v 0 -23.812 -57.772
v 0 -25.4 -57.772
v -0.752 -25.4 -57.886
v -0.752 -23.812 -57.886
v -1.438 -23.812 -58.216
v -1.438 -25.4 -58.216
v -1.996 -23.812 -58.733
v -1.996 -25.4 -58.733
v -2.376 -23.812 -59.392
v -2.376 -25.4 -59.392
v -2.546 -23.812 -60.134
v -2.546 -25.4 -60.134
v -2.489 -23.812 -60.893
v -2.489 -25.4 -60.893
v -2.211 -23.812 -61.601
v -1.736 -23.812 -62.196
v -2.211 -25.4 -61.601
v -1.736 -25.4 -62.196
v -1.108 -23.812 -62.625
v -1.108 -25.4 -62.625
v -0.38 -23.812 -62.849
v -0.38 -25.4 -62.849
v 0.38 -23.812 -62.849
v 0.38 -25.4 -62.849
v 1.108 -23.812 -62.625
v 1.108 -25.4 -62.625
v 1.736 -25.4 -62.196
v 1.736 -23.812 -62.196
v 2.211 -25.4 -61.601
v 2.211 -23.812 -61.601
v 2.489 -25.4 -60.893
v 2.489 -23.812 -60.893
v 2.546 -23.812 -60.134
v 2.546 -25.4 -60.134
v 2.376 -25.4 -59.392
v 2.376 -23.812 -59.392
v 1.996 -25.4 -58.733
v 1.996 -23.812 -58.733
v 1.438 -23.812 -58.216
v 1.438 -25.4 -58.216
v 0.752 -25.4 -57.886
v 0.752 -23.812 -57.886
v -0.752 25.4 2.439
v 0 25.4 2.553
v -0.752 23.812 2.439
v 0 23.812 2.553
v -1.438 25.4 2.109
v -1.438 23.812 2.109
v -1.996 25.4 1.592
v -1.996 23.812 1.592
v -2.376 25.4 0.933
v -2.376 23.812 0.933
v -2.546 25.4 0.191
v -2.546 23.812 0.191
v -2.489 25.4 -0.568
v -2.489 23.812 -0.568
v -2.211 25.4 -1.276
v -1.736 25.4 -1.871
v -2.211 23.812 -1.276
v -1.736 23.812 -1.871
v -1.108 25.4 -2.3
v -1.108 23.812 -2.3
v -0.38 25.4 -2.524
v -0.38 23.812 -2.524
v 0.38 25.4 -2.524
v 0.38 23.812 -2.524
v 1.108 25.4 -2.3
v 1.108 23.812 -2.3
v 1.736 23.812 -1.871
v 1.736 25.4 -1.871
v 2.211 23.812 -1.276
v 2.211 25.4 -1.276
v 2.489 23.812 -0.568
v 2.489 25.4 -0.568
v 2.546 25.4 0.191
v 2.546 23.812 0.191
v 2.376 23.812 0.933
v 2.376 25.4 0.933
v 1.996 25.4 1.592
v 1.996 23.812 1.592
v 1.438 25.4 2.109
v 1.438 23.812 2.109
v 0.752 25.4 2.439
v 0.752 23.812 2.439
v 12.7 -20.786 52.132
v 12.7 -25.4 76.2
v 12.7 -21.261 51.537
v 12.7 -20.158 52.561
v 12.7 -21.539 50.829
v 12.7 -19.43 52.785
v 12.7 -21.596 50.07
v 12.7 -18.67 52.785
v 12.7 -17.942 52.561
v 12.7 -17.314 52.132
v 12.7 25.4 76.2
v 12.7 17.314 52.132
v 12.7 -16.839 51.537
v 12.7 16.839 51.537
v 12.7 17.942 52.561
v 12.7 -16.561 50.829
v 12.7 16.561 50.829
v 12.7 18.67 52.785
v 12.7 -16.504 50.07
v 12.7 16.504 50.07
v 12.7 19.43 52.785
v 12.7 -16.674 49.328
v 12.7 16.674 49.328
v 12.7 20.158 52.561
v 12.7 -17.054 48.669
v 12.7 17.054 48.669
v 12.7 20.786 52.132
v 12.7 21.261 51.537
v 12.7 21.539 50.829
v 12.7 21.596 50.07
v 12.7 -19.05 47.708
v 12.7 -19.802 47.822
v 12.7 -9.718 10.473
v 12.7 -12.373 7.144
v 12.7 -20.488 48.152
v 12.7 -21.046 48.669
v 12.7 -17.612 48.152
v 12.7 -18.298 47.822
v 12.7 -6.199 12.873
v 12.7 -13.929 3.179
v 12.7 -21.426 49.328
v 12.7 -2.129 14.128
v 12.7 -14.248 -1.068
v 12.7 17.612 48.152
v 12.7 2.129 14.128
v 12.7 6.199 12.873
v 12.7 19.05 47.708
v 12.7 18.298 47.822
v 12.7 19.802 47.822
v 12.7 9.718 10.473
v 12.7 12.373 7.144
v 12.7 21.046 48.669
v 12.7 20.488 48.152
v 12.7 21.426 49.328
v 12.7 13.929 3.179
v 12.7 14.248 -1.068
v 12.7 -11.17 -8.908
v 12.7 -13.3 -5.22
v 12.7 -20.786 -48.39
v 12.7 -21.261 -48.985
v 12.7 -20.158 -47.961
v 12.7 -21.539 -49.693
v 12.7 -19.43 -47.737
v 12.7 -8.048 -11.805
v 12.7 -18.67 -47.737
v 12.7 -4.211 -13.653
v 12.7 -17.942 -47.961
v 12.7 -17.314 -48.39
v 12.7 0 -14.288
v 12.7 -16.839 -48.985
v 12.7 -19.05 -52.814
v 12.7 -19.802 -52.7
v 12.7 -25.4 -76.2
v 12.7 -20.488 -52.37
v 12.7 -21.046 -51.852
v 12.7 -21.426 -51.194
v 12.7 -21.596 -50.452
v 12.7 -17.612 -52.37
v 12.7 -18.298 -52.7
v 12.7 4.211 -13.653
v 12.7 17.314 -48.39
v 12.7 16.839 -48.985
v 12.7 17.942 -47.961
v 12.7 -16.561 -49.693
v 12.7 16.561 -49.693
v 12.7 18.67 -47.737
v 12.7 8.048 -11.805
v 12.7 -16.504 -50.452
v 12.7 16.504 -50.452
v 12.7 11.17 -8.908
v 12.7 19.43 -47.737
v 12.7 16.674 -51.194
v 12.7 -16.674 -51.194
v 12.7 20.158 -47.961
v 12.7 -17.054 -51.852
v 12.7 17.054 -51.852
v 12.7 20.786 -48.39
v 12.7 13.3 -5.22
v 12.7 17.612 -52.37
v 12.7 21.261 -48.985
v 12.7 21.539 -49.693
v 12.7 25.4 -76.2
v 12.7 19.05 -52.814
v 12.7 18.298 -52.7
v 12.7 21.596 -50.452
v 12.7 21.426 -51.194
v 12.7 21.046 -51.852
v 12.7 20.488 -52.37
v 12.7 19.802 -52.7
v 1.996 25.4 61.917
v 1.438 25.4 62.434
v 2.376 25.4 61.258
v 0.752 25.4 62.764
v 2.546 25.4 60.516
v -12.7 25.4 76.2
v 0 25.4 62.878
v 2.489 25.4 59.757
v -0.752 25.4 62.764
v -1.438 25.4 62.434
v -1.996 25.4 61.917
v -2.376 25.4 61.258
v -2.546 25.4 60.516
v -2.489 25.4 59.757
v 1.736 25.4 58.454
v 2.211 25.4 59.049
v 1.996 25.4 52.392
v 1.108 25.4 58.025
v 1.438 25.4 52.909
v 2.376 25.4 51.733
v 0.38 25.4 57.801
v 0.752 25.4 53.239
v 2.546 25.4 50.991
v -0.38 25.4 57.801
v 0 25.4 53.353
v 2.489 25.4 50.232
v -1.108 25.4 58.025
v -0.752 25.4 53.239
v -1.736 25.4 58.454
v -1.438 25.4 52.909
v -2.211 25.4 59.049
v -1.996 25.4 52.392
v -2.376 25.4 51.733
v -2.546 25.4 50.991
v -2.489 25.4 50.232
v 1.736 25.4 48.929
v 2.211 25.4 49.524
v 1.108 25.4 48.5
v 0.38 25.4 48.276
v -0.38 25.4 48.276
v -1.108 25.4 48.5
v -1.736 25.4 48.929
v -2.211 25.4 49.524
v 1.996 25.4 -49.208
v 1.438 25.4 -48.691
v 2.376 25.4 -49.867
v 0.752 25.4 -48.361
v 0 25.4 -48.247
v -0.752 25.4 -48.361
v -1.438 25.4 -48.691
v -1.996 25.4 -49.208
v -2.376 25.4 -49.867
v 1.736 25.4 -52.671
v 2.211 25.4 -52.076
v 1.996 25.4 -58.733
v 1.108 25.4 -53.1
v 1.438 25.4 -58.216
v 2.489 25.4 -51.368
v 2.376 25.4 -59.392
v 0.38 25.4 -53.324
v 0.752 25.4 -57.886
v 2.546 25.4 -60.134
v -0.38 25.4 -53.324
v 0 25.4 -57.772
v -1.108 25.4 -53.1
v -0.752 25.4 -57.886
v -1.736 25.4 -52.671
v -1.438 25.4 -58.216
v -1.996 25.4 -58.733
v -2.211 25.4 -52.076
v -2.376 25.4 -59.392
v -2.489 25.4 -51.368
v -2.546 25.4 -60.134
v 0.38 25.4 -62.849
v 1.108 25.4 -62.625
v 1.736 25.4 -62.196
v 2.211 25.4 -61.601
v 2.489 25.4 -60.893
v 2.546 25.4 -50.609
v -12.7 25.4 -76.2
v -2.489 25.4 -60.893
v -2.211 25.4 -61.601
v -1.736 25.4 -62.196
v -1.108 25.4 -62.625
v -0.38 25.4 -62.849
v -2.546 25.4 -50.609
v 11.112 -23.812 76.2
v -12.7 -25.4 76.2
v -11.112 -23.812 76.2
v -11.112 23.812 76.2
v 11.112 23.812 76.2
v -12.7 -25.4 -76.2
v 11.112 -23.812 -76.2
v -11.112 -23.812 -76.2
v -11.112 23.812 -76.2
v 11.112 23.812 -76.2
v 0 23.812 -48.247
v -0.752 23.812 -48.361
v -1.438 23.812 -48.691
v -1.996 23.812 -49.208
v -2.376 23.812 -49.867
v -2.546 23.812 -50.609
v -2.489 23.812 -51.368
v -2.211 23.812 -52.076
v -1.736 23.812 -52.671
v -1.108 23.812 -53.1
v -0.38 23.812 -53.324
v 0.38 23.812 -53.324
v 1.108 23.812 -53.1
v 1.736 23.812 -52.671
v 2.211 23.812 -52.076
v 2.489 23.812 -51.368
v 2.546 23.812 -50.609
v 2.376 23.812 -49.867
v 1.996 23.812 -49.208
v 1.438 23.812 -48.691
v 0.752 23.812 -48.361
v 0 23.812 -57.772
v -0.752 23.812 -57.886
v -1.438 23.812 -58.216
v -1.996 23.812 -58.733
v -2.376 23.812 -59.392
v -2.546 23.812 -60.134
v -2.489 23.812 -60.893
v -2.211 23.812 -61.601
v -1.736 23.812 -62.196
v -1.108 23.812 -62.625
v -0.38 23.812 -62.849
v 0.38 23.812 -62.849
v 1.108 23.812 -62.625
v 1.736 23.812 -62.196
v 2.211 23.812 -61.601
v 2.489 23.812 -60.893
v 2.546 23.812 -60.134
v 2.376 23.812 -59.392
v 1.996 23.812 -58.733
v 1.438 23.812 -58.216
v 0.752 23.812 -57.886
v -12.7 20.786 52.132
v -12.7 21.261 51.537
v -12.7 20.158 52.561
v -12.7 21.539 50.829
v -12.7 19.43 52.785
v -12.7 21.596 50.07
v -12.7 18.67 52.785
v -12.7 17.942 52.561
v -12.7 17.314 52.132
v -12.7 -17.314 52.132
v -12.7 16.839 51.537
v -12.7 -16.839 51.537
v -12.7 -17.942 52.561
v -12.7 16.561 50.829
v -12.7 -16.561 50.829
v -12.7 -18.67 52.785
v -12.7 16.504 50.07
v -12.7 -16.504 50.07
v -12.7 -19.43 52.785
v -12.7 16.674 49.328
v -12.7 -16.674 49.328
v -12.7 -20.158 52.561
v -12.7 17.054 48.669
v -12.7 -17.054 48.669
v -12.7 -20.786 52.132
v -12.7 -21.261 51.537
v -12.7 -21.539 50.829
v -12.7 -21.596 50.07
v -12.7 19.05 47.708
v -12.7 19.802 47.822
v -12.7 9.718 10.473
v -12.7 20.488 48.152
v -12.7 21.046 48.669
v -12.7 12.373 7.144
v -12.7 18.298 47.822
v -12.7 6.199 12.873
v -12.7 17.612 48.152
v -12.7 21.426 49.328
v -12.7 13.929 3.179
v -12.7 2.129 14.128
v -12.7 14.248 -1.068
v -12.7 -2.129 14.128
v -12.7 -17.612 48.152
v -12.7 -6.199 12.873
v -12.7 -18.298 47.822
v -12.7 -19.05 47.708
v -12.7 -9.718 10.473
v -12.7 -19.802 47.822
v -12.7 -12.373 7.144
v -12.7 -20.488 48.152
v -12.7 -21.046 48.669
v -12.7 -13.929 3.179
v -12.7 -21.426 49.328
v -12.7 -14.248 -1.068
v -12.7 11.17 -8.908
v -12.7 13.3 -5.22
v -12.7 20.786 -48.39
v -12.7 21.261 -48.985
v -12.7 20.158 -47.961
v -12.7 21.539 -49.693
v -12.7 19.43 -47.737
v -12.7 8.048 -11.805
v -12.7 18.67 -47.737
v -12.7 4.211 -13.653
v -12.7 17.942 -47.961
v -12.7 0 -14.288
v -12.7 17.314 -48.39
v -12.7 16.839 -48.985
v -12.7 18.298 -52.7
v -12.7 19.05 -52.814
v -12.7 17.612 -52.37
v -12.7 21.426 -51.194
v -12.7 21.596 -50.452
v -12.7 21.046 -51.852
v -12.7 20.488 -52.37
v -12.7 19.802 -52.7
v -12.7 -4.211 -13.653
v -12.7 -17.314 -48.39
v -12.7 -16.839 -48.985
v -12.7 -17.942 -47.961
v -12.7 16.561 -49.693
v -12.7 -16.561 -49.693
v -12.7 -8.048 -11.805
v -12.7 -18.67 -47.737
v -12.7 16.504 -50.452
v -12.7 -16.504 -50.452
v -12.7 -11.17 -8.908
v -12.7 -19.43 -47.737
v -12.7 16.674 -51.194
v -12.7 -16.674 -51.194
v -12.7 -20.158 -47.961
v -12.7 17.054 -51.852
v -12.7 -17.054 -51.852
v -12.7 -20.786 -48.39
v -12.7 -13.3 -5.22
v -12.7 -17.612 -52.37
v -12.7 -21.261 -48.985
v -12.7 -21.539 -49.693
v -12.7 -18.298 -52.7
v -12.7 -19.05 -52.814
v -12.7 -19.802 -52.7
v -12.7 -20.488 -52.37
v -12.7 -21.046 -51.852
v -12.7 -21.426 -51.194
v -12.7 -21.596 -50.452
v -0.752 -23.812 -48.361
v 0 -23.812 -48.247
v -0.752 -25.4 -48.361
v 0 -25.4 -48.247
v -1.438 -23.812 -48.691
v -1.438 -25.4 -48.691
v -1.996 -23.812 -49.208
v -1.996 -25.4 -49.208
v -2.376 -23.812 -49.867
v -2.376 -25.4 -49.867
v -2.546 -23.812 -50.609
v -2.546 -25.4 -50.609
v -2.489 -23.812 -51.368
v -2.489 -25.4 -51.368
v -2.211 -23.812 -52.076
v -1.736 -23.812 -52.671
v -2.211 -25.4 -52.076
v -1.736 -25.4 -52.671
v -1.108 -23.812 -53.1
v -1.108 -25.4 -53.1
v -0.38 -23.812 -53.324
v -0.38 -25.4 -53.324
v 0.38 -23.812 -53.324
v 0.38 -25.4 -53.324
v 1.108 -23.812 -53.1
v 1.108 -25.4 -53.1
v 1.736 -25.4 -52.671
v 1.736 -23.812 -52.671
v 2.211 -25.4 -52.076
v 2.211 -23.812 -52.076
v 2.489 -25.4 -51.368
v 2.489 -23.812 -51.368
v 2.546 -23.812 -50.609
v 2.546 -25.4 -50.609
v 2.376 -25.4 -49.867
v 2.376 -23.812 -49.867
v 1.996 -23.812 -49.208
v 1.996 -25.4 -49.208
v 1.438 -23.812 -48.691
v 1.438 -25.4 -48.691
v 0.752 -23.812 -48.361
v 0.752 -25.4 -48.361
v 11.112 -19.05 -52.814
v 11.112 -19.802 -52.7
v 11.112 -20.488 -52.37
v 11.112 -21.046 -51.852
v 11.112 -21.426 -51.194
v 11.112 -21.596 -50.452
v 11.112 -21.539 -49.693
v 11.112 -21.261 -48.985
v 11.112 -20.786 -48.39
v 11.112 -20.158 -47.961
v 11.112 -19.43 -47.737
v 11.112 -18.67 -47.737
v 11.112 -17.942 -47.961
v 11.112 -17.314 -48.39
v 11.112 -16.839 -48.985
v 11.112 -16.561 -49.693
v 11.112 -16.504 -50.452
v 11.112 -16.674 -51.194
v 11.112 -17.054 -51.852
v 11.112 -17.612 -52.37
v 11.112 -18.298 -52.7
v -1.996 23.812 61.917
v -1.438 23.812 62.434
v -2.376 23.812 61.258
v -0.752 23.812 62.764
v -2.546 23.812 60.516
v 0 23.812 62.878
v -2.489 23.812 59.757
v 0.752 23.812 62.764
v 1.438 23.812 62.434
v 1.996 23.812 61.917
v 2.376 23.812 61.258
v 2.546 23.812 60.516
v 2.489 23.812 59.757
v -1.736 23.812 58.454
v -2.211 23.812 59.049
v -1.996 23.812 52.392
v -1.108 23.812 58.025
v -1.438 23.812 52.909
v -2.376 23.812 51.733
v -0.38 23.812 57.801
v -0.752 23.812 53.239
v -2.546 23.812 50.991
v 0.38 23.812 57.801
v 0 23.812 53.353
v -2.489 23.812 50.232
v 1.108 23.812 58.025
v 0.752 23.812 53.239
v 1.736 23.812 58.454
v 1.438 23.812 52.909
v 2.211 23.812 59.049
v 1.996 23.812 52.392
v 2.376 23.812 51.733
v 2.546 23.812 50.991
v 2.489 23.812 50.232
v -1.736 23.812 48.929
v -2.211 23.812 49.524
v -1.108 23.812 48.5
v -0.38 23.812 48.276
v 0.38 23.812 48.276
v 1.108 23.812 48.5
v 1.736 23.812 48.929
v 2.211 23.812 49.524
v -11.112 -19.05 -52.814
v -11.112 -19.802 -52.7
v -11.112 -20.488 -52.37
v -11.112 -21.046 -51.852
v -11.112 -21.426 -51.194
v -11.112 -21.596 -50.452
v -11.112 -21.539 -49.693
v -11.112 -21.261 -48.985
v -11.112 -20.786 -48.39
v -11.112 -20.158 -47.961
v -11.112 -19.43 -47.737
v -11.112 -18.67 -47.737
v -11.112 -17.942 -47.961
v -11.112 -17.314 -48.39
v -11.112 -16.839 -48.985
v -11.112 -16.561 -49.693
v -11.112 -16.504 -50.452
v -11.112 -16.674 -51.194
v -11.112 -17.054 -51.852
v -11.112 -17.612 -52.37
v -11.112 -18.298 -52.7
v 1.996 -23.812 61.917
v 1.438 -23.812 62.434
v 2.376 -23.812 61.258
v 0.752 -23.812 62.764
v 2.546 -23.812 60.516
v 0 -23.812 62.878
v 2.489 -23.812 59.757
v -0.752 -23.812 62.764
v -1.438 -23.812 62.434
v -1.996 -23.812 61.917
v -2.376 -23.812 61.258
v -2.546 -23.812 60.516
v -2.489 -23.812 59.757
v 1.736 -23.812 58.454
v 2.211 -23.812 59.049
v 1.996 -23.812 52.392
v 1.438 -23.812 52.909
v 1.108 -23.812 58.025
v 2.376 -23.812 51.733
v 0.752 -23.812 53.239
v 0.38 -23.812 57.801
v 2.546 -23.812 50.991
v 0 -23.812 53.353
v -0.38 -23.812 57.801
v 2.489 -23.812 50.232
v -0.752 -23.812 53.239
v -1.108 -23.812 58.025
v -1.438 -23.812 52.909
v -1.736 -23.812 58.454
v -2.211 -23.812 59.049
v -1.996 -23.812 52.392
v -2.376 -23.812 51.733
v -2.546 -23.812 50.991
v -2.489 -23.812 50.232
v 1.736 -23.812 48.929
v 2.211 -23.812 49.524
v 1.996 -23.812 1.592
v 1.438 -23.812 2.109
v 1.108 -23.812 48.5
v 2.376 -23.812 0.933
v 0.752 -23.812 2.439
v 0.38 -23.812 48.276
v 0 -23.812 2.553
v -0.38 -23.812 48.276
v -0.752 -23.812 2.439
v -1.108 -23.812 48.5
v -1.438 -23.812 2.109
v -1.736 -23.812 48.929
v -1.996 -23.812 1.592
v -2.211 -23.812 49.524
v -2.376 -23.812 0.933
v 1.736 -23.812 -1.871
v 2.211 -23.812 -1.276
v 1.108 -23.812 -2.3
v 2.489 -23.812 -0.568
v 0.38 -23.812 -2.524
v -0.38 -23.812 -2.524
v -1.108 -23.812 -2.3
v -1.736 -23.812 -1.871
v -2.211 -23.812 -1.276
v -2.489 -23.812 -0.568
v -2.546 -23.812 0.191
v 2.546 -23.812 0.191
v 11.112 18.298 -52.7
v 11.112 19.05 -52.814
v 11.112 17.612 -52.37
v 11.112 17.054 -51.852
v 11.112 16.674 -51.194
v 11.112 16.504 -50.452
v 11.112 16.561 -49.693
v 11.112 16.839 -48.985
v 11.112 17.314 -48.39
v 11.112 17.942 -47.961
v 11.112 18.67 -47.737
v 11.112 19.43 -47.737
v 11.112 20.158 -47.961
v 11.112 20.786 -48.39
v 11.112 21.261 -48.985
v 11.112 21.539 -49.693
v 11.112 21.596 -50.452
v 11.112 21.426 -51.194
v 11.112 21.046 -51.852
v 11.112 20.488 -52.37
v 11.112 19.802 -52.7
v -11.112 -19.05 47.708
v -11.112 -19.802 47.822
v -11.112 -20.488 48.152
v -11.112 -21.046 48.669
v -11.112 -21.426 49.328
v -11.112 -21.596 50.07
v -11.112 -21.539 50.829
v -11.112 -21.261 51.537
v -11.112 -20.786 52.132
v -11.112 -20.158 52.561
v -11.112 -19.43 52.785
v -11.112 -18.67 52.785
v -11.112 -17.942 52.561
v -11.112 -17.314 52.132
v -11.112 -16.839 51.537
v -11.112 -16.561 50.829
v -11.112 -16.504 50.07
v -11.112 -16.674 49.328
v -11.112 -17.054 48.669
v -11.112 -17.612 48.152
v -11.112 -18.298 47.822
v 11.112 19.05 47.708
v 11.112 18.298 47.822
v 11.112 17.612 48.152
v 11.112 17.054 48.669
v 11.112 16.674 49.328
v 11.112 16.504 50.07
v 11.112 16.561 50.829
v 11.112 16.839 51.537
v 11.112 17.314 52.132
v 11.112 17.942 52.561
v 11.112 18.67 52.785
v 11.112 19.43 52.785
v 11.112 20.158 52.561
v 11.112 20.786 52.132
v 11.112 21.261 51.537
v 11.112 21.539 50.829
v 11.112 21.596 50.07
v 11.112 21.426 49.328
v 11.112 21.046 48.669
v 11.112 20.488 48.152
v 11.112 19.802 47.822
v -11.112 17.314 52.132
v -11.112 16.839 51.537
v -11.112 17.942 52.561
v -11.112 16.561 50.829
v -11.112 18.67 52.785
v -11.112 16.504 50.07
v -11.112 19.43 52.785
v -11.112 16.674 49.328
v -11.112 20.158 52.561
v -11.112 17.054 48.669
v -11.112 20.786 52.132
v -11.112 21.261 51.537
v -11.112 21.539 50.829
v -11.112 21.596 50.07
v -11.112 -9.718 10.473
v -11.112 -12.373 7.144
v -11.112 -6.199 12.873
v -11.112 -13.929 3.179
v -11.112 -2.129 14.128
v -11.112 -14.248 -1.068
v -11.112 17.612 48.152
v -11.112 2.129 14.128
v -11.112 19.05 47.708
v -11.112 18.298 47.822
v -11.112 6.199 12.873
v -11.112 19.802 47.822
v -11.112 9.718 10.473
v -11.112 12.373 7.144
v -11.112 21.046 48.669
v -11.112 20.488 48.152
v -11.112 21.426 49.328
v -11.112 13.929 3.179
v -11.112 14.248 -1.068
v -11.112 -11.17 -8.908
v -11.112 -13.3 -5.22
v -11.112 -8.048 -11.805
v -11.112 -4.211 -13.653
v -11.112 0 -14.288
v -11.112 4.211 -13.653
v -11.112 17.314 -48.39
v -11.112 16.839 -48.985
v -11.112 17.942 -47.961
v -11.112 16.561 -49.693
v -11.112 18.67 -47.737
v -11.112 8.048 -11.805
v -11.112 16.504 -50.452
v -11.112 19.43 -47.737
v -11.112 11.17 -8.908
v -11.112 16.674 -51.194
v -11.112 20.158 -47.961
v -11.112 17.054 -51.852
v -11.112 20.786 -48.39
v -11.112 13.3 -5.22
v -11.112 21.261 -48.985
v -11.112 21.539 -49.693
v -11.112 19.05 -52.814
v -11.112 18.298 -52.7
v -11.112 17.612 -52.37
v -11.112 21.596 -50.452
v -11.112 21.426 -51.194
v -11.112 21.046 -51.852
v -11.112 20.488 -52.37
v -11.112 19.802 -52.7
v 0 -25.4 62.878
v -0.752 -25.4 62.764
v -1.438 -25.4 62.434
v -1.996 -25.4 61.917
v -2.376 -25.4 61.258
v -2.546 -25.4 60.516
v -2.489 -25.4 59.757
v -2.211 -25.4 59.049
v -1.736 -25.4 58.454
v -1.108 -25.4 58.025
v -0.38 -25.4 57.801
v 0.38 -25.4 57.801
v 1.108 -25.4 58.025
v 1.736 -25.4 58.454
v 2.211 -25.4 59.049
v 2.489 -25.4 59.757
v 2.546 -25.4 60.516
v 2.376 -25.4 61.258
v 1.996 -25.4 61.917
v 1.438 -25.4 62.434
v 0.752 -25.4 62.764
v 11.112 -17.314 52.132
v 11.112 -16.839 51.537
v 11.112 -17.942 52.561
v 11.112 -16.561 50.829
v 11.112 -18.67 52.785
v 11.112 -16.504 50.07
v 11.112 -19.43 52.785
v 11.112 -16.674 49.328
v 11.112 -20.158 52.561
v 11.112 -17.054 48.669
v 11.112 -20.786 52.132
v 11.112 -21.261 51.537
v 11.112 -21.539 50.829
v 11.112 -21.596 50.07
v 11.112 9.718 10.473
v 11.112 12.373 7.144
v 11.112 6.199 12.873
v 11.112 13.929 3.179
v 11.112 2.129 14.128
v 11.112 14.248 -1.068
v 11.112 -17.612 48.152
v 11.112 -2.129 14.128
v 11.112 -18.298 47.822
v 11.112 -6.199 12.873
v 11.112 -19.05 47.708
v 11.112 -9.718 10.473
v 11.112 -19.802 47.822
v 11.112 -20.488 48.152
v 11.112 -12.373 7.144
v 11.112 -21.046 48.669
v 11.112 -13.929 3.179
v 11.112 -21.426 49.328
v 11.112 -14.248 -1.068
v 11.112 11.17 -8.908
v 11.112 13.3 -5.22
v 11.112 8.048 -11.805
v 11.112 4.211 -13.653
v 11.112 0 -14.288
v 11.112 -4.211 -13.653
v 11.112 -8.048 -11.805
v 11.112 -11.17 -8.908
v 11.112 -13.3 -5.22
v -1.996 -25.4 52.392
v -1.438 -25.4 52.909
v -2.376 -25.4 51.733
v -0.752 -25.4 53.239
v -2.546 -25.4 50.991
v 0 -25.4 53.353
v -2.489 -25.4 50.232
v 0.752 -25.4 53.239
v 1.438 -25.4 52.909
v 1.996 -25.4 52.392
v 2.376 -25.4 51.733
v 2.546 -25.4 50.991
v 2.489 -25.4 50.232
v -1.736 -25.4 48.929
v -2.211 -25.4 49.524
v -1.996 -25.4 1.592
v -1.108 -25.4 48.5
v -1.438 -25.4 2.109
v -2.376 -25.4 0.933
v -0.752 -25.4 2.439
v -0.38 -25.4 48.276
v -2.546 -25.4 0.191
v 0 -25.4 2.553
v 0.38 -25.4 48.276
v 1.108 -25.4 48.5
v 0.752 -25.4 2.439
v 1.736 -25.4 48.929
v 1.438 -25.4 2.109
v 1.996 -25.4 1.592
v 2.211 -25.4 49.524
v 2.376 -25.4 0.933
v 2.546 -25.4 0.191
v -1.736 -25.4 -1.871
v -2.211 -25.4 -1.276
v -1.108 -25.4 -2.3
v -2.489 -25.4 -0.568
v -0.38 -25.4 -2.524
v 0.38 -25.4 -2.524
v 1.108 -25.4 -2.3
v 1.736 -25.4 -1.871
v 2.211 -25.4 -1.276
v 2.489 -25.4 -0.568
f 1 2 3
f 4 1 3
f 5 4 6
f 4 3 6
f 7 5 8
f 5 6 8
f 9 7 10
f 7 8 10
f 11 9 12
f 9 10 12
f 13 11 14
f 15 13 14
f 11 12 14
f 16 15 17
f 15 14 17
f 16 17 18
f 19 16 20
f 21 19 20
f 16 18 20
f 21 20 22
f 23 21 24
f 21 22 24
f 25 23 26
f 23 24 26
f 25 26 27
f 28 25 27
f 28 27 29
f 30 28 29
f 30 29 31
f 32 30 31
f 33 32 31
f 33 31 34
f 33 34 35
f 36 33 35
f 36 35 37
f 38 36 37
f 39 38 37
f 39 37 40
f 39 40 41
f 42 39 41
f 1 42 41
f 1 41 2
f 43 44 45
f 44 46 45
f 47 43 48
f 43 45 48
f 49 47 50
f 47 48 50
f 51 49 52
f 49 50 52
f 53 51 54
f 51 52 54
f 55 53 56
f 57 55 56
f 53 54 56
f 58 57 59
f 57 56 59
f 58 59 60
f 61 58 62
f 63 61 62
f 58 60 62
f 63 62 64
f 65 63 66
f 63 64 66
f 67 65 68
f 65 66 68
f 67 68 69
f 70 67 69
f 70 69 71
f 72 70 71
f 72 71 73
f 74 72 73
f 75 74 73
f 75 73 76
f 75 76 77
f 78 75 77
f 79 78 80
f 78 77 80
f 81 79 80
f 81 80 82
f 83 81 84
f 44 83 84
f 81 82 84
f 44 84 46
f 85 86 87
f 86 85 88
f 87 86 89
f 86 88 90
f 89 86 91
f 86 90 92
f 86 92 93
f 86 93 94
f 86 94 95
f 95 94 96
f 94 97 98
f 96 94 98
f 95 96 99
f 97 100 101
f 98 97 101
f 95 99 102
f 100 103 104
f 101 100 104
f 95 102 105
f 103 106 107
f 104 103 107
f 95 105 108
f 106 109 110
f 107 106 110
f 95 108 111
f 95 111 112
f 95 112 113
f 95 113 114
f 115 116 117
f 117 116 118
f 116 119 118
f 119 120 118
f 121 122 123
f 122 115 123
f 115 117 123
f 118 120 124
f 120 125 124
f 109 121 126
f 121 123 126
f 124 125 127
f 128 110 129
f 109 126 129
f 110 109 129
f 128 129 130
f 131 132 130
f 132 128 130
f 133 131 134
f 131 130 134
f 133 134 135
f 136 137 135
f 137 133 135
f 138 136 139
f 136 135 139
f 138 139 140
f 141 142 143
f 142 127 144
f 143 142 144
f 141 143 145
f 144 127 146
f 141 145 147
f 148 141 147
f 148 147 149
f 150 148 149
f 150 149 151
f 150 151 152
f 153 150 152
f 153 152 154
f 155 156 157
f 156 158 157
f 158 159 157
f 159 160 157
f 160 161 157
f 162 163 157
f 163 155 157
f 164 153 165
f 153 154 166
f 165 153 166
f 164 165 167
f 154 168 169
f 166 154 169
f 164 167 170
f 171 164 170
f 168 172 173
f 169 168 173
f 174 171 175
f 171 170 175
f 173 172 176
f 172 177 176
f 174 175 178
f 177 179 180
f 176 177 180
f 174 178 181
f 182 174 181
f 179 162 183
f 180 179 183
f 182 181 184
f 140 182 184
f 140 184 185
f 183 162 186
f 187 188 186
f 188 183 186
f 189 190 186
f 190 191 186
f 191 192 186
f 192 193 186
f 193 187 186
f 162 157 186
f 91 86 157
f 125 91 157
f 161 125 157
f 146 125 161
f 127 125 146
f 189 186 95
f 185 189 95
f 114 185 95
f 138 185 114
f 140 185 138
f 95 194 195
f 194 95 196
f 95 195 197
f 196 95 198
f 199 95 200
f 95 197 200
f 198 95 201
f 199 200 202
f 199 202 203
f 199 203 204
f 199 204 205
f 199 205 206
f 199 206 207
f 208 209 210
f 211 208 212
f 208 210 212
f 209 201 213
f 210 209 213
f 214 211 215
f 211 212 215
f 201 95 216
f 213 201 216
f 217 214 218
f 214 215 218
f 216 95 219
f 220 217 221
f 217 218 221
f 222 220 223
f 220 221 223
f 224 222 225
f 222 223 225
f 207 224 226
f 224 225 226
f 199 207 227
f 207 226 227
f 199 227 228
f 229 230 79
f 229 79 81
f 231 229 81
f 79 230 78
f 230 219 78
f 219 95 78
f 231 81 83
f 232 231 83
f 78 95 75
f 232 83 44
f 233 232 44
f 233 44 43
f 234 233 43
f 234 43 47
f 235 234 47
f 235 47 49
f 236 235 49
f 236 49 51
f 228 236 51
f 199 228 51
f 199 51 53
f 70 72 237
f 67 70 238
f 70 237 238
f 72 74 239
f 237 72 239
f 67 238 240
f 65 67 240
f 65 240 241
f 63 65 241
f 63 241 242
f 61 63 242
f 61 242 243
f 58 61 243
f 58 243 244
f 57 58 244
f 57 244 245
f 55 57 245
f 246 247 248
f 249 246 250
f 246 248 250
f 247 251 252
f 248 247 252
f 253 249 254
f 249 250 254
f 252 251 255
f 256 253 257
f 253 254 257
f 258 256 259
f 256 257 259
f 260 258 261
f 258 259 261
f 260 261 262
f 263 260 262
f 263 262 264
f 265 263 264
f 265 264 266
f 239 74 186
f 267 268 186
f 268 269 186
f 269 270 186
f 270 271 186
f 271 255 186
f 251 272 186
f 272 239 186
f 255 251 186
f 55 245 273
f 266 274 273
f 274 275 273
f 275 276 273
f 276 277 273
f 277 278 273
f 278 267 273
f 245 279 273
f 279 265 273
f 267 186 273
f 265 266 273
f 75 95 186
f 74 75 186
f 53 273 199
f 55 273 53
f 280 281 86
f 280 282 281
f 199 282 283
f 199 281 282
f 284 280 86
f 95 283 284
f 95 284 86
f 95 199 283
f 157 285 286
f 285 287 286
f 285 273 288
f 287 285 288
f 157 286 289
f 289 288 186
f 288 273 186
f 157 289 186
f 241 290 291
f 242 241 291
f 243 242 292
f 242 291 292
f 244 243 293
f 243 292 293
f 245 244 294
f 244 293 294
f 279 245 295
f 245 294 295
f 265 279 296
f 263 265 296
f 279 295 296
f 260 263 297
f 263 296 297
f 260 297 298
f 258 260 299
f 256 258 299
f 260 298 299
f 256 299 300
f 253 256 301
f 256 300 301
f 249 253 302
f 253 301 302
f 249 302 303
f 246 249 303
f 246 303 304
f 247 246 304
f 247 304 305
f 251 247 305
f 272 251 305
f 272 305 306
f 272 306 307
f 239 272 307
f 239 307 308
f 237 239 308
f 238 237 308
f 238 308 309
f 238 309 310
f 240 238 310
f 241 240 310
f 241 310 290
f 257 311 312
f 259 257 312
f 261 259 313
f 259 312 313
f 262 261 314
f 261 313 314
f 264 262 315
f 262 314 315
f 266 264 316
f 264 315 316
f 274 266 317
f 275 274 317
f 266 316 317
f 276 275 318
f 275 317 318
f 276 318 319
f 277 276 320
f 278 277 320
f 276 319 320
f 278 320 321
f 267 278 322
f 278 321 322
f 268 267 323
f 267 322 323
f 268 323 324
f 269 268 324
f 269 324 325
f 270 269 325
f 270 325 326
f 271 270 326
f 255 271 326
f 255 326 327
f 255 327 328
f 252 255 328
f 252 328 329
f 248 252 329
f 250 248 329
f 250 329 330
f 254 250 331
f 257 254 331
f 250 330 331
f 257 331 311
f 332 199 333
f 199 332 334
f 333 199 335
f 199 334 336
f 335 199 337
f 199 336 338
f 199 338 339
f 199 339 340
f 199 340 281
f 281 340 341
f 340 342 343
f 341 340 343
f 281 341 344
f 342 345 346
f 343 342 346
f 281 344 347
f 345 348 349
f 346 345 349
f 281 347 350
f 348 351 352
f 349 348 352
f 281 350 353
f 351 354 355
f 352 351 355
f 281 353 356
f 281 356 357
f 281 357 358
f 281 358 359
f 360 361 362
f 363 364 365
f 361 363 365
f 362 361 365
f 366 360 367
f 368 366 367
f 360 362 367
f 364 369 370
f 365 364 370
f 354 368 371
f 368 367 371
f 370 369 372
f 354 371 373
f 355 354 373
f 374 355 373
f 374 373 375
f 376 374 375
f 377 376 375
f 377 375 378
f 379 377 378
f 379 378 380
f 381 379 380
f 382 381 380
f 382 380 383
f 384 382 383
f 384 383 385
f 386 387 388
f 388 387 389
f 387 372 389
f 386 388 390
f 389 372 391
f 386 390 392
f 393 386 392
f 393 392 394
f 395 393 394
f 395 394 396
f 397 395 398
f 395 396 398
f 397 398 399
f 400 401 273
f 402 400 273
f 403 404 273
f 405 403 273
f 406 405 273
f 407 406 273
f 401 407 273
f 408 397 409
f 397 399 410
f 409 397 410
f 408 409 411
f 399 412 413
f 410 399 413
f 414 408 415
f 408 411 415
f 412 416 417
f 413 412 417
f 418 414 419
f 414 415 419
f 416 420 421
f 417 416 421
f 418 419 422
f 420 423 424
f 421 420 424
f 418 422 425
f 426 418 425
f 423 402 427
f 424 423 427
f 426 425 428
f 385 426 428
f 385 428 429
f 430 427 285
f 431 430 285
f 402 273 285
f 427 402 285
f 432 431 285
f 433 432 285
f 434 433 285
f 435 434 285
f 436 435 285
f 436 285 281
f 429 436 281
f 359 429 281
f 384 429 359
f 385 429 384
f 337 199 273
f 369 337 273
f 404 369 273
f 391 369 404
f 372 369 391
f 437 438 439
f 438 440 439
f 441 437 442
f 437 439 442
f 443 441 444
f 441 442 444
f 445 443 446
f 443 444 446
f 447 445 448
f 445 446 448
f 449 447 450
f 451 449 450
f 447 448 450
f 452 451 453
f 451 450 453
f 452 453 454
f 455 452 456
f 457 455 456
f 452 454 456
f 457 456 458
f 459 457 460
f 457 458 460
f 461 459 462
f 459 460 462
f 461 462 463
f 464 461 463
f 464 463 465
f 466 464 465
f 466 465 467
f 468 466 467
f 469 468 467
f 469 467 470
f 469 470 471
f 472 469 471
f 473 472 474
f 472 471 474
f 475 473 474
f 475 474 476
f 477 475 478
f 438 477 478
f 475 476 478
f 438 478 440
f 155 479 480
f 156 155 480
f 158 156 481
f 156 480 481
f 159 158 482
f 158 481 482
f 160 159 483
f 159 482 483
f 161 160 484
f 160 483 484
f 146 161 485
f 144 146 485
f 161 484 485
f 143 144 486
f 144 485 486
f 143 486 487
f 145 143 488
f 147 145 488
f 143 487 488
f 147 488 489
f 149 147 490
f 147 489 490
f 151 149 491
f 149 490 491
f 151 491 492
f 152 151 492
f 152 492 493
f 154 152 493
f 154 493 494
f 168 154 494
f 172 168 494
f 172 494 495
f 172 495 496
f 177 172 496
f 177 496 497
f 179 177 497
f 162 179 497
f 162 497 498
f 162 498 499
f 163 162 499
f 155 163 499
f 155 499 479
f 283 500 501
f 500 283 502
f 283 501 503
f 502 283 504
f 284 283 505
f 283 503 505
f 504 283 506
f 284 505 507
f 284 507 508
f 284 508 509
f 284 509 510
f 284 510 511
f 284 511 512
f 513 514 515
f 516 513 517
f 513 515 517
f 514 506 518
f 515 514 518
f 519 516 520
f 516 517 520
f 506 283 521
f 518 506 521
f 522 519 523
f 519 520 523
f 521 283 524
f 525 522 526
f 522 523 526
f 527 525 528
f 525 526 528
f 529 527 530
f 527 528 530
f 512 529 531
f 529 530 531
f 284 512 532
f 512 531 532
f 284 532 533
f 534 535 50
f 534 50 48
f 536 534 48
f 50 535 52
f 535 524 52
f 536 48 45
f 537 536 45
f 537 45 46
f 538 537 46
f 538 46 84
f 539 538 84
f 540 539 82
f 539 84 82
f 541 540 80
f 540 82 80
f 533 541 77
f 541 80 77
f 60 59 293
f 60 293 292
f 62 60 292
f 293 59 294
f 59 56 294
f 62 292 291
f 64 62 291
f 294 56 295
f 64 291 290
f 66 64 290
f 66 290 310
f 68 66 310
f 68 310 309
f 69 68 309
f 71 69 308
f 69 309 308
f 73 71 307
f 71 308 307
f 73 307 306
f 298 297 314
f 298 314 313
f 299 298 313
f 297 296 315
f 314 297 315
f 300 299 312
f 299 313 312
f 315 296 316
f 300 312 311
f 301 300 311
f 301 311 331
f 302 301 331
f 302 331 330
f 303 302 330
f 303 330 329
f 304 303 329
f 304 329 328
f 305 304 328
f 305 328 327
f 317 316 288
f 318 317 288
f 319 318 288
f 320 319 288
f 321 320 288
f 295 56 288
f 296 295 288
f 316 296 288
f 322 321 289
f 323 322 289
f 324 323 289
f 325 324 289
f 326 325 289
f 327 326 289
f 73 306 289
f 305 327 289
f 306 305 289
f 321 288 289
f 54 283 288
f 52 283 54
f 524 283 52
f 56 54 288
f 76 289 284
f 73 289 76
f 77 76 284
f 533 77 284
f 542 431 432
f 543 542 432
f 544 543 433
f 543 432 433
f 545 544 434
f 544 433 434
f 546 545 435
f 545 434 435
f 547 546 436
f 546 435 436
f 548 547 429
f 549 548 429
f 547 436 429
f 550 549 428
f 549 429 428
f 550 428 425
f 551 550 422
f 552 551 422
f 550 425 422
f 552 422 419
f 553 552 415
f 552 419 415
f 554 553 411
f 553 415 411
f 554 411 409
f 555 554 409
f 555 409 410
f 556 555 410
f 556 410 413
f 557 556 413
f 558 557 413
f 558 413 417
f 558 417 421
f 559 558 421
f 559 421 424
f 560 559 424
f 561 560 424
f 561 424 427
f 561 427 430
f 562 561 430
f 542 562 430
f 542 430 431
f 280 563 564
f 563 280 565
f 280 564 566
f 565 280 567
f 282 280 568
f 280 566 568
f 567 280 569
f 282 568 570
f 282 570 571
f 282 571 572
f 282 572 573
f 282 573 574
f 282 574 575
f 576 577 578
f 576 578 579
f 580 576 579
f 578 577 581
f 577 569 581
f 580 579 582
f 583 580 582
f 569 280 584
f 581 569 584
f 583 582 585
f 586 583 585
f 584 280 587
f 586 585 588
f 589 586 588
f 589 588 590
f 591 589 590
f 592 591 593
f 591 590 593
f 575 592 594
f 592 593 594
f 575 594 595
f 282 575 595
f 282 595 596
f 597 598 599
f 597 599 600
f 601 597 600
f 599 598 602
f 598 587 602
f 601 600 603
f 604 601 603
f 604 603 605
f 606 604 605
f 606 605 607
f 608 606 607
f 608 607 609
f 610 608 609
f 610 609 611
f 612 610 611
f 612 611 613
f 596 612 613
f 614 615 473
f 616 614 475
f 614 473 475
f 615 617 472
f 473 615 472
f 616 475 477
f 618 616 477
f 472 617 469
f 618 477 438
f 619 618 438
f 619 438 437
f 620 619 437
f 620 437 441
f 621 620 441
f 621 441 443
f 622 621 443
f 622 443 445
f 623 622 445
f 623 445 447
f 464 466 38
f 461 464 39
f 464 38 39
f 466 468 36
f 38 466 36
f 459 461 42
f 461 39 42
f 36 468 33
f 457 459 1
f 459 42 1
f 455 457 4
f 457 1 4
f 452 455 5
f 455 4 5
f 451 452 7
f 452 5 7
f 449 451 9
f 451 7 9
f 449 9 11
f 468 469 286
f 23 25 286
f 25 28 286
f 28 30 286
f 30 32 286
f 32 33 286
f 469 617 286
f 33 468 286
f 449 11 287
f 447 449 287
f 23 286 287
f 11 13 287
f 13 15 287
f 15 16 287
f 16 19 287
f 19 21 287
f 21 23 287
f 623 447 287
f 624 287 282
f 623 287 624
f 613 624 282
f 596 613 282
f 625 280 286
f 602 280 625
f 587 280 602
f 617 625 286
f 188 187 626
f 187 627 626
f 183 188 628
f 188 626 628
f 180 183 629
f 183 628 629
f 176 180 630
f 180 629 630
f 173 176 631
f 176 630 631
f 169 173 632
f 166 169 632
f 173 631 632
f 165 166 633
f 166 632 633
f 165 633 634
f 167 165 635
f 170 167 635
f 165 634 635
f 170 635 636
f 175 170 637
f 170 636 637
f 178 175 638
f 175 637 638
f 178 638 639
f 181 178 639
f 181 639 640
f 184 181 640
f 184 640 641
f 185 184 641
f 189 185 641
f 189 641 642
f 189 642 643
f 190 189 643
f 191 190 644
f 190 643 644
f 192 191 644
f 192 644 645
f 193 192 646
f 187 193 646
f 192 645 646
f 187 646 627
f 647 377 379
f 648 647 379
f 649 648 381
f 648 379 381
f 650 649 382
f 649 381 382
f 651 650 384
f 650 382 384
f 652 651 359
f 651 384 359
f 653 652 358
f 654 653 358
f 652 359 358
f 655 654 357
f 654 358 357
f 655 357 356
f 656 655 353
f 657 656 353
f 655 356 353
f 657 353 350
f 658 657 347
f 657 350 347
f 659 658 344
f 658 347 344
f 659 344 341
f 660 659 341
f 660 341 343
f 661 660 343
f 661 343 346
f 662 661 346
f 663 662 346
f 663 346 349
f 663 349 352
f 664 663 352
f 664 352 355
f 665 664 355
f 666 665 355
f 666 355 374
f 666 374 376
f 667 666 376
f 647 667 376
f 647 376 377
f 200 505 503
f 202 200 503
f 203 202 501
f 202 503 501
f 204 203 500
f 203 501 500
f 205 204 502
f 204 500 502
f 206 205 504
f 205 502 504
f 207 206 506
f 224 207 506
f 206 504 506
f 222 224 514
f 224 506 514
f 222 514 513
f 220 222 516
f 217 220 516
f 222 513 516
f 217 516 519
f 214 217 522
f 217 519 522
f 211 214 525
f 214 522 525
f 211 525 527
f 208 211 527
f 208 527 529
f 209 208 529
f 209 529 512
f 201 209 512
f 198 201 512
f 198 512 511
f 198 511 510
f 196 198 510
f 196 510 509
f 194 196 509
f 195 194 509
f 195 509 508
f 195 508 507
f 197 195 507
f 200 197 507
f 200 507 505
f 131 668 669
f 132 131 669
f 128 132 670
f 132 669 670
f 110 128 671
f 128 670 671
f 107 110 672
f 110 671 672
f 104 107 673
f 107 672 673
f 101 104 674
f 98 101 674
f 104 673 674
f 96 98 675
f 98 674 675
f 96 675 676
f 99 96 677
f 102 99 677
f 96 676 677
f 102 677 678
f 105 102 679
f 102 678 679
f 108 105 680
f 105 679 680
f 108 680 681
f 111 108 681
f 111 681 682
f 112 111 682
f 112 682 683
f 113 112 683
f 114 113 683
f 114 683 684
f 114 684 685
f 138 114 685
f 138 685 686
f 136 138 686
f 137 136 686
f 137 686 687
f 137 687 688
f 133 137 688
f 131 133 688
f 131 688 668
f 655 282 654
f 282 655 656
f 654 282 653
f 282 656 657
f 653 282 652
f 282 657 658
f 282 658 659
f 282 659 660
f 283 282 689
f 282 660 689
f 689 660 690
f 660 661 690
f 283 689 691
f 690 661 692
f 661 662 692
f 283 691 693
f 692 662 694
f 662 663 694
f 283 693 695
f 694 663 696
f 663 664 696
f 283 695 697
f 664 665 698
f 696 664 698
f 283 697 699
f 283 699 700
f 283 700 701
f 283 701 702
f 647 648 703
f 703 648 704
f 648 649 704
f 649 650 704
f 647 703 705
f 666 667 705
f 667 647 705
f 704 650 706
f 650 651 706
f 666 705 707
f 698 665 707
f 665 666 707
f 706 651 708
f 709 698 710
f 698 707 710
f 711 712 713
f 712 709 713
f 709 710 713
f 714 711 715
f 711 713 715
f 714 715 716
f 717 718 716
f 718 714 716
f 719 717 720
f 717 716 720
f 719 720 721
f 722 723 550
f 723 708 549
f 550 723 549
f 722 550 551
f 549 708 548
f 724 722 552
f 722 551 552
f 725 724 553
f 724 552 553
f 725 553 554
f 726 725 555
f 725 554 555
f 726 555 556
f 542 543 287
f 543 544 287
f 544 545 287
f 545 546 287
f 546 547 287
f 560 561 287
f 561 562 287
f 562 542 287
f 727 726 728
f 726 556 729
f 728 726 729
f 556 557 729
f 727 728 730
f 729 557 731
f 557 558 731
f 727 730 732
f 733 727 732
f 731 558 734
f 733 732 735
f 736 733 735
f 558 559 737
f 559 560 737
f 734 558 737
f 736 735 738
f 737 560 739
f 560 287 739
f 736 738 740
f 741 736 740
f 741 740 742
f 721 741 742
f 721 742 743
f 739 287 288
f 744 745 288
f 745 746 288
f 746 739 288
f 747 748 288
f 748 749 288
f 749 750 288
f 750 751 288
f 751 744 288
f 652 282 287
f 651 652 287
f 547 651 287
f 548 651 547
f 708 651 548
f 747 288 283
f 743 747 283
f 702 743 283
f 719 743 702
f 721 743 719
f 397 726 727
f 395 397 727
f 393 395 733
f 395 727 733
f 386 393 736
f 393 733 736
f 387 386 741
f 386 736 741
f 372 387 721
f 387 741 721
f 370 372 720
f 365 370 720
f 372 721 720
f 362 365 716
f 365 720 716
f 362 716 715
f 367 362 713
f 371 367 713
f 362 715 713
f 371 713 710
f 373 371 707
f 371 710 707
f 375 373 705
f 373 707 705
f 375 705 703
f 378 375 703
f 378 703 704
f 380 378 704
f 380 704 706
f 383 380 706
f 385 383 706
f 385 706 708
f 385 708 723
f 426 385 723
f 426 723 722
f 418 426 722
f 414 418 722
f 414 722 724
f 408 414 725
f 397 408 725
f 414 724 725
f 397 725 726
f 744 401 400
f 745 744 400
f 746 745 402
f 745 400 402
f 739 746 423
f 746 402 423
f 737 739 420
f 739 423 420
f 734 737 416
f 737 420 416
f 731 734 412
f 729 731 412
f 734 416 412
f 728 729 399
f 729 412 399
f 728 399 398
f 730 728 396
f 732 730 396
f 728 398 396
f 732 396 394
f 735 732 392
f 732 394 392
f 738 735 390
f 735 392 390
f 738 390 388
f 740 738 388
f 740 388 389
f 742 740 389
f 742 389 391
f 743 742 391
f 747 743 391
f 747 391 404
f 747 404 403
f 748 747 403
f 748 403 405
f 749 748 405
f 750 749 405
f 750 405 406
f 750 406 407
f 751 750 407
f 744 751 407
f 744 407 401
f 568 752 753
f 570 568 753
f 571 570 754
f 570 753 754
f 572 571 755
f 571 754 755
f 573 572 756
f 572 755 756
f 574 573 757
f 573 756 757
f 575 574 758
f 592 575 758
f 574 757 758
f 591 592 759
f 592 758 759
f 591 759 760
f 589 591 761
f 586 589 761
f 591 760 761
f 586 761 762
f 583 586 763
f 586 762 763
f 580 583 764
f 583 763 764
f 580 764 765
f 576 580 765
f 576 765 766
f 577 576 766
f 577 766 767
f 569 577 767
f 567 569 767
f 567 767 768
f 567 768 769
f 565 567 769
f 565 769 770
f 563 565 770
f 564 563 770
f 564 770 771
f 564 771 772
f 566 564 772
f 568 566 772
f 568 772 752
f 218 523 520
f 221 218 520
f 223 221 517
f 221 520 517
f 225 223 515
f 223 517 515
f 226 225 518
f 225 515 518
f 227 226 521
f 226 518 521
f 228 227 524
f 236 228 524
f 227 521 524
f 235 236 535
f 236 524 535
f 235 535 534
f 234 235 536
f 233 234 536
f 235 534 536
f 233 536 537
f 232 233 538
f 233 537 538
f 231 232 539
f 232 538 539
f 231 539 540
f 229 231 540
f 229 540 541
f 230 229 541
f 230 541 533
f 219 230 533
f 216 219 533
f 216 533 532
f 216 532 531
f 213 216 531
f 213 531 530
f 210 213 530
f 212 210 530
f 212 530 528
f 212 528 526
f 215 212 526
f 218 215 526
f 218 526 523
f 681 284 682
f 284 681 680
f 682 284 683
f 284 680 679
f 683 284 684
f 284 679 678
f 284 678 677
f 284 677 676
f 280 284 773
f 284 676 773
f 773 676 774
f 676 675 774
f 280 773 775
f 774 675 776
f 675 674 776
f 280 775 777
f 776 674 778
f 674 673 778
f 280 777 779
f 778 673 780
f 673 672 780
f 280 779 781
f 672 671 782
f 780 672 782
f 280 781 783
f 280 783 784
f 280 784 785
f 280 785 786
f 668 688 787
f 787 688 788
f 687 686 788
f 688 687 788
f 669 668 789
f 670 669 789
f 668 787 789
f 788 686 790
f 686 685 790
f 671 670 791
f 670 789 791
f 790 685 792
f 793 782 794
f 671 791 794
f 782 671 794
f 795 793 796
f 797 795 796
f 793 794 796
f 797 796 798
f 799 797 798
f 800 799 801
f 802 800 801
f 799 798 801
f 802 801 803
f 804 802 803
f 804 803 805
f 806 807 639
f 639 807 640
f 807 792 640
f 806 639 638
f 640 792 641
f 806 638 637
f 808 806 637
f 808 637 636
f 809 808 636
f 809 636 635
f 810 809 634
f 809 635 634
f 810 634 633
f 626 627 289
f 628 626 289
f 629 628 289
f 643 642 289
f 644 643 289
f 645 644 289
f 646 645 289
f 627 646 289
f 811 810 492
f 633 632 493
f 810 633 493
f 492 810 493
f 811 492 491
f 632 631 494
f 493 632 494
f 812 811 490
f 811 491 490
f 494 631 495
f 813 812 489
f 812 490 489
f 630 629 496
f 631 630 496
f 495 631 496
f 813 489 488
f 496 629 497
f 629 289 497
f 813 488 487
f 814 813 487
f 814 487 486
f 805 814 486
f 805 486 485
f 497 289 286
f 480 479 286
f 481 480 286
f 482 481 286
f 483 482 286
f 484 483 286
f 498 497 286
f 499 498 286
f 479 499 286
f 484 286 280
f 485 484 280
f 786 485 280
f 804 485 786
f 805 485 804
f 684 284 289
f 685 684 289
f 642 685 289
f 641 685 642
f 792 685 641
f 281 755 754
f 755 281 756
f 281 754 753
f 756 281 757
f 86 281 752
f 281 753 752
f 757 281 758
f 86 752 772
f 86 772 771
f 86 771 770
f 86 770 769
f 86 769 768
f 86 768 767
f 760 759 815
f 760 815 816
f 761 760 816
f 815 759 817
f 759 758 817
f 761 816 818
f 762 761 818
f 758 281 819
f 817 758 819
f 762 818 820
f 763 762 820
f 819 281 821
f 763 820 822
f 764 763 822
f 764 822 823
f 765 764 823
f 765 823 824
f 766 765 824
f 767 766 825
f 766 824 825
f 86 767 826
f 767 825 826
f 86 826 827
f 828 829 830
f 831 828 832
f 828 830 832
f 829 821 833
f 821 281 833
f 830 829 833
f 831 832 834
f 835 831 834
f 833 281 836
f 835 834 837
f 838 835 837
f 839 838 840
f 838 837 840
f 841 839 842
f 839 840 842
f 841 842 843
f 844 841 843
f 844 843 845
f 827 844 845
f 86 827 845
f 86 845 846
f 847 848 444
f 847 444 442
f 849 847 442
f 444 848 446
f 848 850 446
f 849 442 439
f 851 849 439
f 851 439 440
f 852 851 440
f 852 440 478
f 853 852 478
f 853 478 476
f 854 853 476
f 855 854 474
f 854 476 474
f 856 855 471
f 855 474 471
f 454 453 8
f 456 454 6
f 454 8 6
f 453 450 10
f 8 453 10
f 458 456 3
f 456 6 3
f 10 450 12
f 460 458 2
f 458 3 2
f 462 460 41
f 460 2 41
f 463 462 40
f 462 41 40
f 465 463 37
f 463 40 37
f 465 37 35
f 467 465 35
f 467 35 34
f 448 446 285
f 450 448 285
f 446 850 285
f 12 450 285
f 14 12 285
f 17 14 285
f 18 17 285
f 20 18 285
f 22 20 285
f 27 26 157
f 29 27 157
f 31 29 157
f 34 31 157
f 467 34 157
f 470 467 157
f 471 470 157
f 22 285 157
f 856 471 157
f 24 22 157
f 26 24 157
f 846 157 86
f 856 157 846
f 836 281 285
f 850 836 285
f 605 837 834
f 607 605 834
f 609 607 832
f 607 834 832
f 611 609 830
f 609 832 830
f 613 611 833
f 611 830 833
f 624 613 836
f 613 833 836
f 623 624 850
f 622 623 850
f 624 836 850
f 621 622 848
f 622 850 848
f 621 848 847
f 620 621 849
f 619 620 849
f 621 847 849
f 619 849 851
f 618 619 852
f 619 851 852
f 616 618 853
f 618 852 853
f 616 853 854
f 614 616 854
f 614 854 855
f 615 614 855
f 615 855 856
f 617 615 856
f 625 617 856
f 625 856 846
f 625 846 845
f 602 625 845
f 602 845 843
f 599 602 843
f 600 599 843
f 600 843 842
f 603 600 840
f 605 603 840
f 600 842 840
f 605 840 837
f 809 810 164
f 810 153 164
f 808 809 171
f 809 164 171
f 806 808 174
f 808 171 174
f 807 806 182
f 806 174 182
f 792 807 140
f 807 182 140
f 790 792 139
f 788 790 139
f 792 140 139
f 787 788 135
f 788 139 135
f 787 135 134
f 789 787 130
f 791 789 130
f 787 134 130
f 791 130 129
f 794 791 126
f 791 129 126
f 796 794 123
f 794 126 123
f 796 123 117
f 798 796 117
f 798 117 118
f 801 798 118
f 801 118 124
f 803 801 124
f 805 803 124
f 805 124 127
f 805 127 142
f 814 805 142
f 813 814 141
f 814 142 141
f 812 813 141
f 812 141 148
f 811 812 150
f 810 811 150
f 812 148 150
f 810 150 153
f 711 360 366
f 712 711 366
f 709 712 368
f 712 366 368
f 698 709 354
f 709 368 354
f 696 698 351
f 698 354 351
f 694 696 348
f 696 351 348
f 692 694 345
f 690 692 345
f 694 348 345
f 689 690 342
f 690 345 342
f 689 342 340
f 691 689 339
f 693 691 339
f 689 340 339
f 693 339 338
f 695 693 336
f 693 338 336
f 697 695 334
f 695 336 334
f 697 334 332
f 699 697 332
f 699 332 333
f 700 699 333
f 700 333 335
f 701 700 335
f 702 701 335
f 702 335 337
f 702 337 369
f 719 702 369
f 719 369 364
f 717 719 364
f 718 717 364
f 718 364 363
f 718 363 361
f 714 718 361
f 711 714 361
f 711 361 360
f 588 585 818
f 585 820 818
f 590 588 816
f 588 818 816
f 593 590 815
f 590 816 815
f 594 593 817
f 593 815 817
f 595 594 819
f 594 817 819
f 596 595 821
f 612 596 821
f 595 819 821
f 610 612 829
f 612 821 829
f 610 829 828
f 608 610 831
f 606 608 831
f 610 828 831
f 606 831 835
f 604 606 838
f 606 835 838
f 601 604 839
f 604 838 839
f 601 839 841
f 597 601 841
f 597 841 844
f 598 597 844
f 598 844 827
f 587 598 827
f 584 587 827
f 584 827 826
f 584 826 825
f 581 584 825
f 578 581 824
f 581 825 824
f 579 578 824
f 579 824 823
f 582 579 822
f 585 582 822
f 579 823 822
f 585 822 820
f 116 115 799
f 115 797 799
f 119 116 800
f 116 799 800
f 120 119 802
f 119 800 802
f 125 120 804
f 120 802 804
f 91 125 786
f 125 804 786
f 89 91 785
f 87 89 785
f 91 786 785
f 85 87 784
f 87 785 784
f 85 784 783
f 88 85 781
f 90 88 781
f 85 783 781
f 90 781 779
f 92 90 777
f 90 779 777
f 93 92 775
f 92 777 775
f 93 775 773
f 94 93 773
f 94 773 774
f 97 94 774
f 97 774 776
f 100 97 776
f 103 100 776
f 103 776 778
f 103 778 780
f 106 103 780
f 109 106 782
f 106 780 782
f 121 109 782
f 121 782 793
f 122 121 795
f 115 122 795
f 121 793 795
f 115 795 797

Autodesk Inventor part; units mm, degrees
ref_plane "YZ Plane" through (0, 0, 0) normal (1, 0, 0) x (0, 1, 0)
ref_plane "XZ Plane" through (0, 0, 0) normal (0, 1, 0) x (-1, 0, 0)
ref_plane "XY Plane" through (0, 0, 0) normal (0, 0, 1) x (1, 0, 0)
sketch "Sketch1" plane through (0, 0, 0) normal (0, 0, 1) x (1, 0, 0)
  line L0 (-12.7, -25.4) -> (12.7, -25.4)
  line L1 (12.7, -25.4) -> (12.7, 25.4)
  line L2 (12.7, 25.4) -> (-12.7, 25.4)
  line L3 (-12.7, 25.4) -> (-12.7, -25.4)
  line L4 (-12.7, -25.4) -> (12.7, 25.4) construction
  line L5 (12.7, -25.4) -> (-12.7, 25.4) construction
  line L6 (-11.1125, 23.8125) -> (11.1125, 23.8125)
  line L7 (11.1125, 23.8125) -> (11.1125, -23.8125)
  line L8 (11.1125, -23.8125) -> (-11.1125, -23.8125)
  line L9 (-11.1125, -23.8125) -> (-11.1125, 23.8125)
  point P0 (0, 0)
  dimension "width" = 25.4
  dimension "height" = 50.8
  dimension "thickness" = 1.5875
extrude "Extrusion1" add sketch "Sketch1" along normal mid plane 152.4
sketch "Sketch2" plane through (-12.7, 25.4, 76.2) normal (0, 1, 0) x (1, 0, 0)
  line L0 (0, 152.4) -> (0, 0) construction
  line L1 (25.4, 0) -> (0, 0) construction
  line L2 (25.4, 152.4) -> (25.4, 0) construction
  line L3 (0, 152.4) -> (25.4, 152.4) construction
  line L4 (12.7, 127) -> (12.7, 25.4) construction
  point P0 (12.7, 76.2)
  point P1 (12.7, 76.2)
  point P2 (12.7, 76.2)
  dimension "d5" = 101.6
hole "Hole1" at (0, 25.4, -50.8) at (0, 25.4, 50.8) at (0, 25.4, 0) direction (0, -1, 0) diameter 5.1054 end through all clearance for "Flat Head Machine Screw (82)" size "#10" standard "Ansi Unified Screw Threads"
sketch "Sketch4" plane through (12.7, -25.4, 76.2) normal (1, 0, 0) x (0, 0, -1)
  circle A0 centre (76.2, 25.4) radius 53.75 construction
  line L0 (25.9391, 6.35) -> (126.4609, 6.35) construction
  line L1 (126.4609, 6.35) -> (126.4609, 44.45) construction
  line L2 (126.4609, 44.45) -> (25.9391, 44.45) construction
  line L3 (25.9391, 44.45) -> (25.9391, 6.35) construction
  line L4 (25.9391, 6.35) -> (126.4609, 44.45) construction
  line L5 (126.4609, 6.35) -> (25.9391, 44.45) construction
  line L6 (0, 0) -> (0, 50.8) construction
  dimension "d25" = 107.5
  dimension "d28" = 38.1
hole "Hole3" at (12.7, 19.05, 50.2609) at (12.7, 19.05, -50.2609) at (12.7, -19.05, -50.2609) at (12.7, -19.05, 50.2609) direction (-1, 0, 0) diameter 5.1054 end through all clearance for "Flat Head Machine Screw (82)" size "#10" standard "Ansi Unified Screw Threads"
sketch "Sketch5" plane through (-12.7, 25.4, 76.2) normal (0, 1, 0) x (1, 0, 0)
  line L0 (25.4, 0) -> (0, 0) projected
  line L1 (12.7, 136.525) -> (12.7, 15.875) construction
  line L2 (0, 152.4) -> (0, 0) construction
  point P0 (12.7, 76.2)
  point P1 (12.7, 0)
  point P2 (12.7, 76.2)
  point P3 (0, 76.2)
  dimension "d36" = 120.65
hole "Hole4" at (0, 25.4, -60.325) at (0, 25.4, 60.325) direction (0, -1, 0) diameter 5.1054 end through all clearance for "Flat Head Machine Screw (82)" size "#10" standard "Ansi Unified Screw Threads"
sketch "Sketch6" plane through (12.7, -25.4, 76.2) normal (1, 0, 0) x (0, 0, -1)
  circle A0 centre (126.4609, 6.35) radius 2.5527 construction
  circle A1 centre (25.9391, 44.45) radius 2.5527 construction
  circle A2 centre (126.4609, 44.45) radius 2.5527 construction
  circle A3 centre (25.9391, 6.35) radius 2.5527 construction
  line L0 (152.4, 50.8) -> (0, 50.8) construction
  line L1 (0, 0) -> (0, 50.8) construction
  line L2 (152.4, 0) -> (0, 0) construction
  line L3 (152.4, 50.8) -> (152.4, 0) construction
  circle A4 centre (126.4609, 6.35) radius 2.5527 construction
  line L4 (25.9391, 44.45) -> (126.4609, 44.45) construction
  line L5 (126.4609, 44.45) -> (126.4609, 6.35) construction
  line L6 (126.4609, 6.35) -> (25.9391, 6.35) construction
  line L7 (25.9391, 6.35) -> (25.9391, 44.45) construction
  circle A5 centre (76.2, 25.4) radius 14.2875
  dimension "d44" = 28.575
extrude "Extrusion2" cut sketch "Sketch6" against normal through all
sketch "Sketch3" plane through (12.7, -25.4, 76.2) normal (1, 0, 0) x (0, 0, -1)
  line L0 (25.9391, 44.45) -> (126.4609, 44.45) construction
  line L1 (126.4609, 44.45) -> (126.4609, 6.35) construction
  line L2 (126.4609, 6.35) -> (25.9391, 6.35) construction
  line L3 (25.9391, 6.35) -> (25.9391, 44.45) construction
  line L4 (25.9391, 44.45) -> (126.4609, 6.35) construction
  line L5 (126.4609, 44.45) -> (25.9391, 6.35) construction
  circle A0 centre (76.2, 25.4) radius 60 construction
  circle A1 centre (76.2, 25.4) radius 47.5 construction
  circle A2 centre (76.2, 25.4) radius 53.75 construction
  dimension "d16" = 107.5
  dimension "d14" = 120
  dimension "d15" = 95
  dimension "d17" = 38.1
properties part number "GP10-005" material "Aluminum 6061"
